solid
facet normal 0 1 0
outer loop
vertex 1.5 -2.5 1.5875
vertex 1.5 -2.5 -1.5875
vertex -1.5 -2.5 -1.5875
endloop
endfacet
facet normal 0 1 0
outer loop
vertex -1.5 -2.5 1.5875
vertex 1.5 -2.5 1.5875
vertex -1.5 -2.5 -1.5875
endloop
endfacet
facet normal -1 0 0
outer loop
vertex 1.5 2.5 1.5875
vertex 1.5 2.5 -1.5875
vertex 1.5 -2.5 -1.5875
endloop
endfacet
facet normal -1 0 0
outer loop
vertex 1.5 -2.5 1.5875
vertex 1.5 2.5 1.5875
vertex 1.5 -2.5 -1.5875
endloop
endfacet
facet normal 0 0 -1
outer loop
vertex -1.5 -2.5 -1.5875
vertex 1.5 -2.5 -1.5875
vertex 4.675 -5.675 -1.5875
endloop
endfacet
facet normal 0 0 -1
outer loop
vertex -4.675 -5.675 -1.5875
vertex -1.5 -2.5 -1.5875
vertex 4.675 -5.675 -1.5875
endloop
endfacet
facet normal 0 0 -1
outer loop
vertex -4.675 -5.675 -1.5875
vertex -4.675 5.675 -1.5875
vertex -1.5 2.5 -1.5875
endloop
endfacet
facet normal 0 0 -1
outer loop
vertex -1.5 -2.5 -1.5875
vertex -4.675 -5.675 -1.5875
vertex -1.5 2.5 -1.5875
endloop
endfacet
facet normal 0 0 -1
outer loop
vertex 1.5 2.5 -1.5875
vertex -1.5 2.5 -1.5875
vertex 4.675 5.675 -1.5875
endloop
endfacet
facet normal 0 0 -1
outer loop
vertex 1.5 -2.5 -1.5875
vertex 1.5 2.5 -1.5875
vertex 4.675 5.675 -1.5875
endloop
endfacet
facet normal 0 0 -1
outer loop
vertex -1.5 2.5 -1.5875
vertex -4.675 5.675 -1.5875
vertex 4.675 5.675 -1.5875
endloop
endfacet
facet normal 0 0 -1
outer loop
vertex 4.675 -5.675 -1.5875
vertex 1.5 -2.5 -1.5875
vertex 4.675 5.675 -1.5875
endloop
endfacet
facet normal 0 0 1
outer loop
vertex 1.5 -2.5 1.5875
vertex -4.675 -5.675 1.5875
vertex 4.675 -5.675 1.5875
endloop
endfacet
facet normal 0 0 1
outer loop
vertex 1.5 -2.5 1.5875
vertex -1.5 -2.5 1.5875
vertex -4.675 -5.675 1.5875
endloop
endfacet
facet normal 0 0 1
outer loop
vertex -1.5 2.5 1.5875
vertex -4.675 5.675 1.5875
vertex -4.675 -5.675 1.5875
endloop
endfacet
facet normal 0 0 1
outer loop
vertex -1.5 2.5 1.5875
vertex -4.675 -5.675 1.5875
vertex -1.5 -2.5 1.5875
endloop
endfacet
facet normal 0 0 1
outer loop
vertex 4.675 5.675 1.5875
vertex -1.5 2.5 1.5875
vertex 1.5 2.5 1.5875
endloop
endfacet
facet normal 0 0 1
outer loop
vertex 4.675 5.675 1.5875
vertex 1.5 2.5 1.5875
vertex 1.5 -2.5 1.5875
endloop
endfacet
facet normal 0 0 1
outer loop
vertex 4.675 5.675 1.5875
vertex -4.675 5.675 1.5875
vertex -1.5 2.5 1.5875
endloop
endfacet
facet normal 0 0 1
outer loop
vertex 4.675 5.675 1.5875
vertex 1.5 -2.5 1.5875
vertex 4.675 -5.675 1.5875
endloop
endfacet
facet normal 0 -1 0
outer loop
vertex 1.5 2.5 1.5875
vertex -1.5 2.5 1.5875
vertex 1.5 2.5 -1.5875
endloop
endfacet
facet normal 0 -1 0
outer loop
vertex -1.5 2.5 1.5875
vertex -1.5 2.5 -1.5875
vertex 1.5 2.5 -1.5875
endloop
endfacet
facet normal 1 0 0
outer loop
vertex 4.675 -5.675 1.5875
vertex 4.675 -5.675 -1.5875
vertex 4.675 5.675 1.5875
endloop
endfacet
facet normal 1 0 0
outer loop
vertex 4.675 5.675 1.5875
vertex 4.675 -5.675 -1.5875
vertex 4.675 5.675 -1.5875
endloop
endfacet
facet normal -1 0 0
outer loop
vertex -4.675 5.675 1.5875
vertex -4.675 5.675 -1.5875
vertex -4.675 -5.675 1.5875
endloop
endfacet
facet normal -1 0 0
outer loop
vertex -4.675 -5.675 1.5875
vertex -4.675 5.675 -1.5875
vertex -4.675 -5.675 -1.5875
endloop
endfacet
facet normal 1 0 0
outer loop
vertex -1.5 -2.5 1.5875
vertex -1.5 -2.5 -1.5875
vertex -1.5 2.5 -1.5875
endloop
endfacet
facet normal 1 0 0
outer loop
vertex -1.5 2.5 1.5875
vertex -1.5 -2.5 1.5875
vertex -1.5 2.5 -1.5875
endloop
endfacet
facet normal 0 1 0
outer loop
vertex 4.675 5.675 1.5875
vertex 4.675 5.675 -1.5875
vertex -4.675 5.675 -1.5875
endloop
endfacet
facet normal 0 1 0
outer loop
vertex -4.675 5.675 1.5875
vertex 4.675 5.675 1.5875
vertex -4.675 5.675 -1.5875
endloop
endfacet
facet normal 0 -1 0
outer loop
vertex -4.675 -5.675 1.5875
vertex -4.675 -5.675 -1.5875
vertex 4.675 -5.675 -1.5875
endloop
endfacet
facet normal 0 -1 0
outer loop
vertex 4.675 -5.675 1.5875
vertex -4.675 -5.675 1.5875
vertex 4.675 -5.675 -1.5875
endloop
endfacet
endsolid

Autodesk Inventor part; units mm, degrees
ref_plane "YZ Plane" through (0, 0, 0) normal (1, 0, 0) x (0, 1, 0)
ref_plane "XZ Plane" through (0, 0, 0) normal (0, 1, 0) x (-1, 0, 0)
ref_plane "XY Plane" through (0, 0, 0) normal (0, 0, 1) x (1, 0, 0)
sketch "Sketch1" plane through (0, 0, 0) normal (0, 0, 1) x (1, 0, 0)
  line L0 (-1.5, 2.5) -> (1.5, 2.5)
  line L1 (1.5, 2.5) -> (1.5, -2.5)
  line L2 (1.5, -2.5) -> (-1.5, -2.5)
  line L3 (-1.5, -2.5) -> (-1.5, 2.5)
  line L4 (-1.5, 2.5) -> (1.5, -2.5) construction
  line L5 (1.5, 2.5) -> (-1.5, -2.5) construction
  line L6 (4.675, 5.675) -> (-4.675, 5.675)
  line L7 (-4.675, 5.675) -> (-4.675, -5.675)
  line L8 (-4.675, -5.675) -> (4.675, -5.675)
  line L9 (4.675, -5.675) -> (4.675, 5.675)
  point P0 (0, 0)
  dimension "d0" = 3
  dimension "d1" = 5
  dimension "d2" = 3.175
extrude "Extrusion1" add sketch "Sketch1" along normal mid plane 3.175
properties part number "Motor Fitting Test"
